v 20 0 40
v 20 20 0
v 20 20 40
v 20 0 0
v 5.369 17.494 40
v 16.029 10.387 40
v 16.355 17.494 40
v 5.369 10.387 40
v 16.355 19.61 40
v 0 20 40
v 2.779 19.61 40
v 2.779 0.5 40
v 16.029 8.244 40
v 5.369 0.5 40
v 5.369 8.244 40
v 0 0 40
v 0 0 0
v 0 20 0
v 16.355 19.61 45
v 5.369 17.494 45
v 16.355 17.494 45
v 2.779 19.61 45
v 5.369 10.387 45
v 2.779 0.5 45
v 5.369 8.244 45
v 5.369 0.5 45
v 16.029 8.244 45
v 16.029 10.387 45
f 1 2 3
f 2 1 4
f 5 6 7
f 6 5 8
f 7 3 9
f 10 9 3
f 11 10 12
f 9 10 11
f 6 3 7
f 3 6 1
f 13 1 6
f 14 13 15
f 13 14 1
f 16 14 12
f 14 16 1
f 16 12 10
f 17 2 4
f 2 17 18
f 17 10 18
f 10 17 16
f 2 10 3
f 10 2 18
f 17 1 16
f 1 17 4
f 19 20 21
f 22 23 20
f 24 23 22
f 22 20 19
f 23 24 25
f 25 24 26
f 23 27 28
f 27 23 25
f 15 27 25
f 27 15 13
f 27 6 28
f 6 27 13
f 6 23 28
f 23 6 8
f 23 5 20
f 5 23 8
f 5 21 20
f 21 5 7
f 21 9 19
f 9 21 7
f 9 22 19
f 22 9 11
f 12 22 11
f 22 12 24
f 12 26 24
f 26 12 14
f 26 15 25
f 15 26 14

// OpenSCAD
cube([20, 20, 40]);
translate([0.5, 0.5, 40]){
    linear_extrude(5){
        text("F", size=20);
    }
}
